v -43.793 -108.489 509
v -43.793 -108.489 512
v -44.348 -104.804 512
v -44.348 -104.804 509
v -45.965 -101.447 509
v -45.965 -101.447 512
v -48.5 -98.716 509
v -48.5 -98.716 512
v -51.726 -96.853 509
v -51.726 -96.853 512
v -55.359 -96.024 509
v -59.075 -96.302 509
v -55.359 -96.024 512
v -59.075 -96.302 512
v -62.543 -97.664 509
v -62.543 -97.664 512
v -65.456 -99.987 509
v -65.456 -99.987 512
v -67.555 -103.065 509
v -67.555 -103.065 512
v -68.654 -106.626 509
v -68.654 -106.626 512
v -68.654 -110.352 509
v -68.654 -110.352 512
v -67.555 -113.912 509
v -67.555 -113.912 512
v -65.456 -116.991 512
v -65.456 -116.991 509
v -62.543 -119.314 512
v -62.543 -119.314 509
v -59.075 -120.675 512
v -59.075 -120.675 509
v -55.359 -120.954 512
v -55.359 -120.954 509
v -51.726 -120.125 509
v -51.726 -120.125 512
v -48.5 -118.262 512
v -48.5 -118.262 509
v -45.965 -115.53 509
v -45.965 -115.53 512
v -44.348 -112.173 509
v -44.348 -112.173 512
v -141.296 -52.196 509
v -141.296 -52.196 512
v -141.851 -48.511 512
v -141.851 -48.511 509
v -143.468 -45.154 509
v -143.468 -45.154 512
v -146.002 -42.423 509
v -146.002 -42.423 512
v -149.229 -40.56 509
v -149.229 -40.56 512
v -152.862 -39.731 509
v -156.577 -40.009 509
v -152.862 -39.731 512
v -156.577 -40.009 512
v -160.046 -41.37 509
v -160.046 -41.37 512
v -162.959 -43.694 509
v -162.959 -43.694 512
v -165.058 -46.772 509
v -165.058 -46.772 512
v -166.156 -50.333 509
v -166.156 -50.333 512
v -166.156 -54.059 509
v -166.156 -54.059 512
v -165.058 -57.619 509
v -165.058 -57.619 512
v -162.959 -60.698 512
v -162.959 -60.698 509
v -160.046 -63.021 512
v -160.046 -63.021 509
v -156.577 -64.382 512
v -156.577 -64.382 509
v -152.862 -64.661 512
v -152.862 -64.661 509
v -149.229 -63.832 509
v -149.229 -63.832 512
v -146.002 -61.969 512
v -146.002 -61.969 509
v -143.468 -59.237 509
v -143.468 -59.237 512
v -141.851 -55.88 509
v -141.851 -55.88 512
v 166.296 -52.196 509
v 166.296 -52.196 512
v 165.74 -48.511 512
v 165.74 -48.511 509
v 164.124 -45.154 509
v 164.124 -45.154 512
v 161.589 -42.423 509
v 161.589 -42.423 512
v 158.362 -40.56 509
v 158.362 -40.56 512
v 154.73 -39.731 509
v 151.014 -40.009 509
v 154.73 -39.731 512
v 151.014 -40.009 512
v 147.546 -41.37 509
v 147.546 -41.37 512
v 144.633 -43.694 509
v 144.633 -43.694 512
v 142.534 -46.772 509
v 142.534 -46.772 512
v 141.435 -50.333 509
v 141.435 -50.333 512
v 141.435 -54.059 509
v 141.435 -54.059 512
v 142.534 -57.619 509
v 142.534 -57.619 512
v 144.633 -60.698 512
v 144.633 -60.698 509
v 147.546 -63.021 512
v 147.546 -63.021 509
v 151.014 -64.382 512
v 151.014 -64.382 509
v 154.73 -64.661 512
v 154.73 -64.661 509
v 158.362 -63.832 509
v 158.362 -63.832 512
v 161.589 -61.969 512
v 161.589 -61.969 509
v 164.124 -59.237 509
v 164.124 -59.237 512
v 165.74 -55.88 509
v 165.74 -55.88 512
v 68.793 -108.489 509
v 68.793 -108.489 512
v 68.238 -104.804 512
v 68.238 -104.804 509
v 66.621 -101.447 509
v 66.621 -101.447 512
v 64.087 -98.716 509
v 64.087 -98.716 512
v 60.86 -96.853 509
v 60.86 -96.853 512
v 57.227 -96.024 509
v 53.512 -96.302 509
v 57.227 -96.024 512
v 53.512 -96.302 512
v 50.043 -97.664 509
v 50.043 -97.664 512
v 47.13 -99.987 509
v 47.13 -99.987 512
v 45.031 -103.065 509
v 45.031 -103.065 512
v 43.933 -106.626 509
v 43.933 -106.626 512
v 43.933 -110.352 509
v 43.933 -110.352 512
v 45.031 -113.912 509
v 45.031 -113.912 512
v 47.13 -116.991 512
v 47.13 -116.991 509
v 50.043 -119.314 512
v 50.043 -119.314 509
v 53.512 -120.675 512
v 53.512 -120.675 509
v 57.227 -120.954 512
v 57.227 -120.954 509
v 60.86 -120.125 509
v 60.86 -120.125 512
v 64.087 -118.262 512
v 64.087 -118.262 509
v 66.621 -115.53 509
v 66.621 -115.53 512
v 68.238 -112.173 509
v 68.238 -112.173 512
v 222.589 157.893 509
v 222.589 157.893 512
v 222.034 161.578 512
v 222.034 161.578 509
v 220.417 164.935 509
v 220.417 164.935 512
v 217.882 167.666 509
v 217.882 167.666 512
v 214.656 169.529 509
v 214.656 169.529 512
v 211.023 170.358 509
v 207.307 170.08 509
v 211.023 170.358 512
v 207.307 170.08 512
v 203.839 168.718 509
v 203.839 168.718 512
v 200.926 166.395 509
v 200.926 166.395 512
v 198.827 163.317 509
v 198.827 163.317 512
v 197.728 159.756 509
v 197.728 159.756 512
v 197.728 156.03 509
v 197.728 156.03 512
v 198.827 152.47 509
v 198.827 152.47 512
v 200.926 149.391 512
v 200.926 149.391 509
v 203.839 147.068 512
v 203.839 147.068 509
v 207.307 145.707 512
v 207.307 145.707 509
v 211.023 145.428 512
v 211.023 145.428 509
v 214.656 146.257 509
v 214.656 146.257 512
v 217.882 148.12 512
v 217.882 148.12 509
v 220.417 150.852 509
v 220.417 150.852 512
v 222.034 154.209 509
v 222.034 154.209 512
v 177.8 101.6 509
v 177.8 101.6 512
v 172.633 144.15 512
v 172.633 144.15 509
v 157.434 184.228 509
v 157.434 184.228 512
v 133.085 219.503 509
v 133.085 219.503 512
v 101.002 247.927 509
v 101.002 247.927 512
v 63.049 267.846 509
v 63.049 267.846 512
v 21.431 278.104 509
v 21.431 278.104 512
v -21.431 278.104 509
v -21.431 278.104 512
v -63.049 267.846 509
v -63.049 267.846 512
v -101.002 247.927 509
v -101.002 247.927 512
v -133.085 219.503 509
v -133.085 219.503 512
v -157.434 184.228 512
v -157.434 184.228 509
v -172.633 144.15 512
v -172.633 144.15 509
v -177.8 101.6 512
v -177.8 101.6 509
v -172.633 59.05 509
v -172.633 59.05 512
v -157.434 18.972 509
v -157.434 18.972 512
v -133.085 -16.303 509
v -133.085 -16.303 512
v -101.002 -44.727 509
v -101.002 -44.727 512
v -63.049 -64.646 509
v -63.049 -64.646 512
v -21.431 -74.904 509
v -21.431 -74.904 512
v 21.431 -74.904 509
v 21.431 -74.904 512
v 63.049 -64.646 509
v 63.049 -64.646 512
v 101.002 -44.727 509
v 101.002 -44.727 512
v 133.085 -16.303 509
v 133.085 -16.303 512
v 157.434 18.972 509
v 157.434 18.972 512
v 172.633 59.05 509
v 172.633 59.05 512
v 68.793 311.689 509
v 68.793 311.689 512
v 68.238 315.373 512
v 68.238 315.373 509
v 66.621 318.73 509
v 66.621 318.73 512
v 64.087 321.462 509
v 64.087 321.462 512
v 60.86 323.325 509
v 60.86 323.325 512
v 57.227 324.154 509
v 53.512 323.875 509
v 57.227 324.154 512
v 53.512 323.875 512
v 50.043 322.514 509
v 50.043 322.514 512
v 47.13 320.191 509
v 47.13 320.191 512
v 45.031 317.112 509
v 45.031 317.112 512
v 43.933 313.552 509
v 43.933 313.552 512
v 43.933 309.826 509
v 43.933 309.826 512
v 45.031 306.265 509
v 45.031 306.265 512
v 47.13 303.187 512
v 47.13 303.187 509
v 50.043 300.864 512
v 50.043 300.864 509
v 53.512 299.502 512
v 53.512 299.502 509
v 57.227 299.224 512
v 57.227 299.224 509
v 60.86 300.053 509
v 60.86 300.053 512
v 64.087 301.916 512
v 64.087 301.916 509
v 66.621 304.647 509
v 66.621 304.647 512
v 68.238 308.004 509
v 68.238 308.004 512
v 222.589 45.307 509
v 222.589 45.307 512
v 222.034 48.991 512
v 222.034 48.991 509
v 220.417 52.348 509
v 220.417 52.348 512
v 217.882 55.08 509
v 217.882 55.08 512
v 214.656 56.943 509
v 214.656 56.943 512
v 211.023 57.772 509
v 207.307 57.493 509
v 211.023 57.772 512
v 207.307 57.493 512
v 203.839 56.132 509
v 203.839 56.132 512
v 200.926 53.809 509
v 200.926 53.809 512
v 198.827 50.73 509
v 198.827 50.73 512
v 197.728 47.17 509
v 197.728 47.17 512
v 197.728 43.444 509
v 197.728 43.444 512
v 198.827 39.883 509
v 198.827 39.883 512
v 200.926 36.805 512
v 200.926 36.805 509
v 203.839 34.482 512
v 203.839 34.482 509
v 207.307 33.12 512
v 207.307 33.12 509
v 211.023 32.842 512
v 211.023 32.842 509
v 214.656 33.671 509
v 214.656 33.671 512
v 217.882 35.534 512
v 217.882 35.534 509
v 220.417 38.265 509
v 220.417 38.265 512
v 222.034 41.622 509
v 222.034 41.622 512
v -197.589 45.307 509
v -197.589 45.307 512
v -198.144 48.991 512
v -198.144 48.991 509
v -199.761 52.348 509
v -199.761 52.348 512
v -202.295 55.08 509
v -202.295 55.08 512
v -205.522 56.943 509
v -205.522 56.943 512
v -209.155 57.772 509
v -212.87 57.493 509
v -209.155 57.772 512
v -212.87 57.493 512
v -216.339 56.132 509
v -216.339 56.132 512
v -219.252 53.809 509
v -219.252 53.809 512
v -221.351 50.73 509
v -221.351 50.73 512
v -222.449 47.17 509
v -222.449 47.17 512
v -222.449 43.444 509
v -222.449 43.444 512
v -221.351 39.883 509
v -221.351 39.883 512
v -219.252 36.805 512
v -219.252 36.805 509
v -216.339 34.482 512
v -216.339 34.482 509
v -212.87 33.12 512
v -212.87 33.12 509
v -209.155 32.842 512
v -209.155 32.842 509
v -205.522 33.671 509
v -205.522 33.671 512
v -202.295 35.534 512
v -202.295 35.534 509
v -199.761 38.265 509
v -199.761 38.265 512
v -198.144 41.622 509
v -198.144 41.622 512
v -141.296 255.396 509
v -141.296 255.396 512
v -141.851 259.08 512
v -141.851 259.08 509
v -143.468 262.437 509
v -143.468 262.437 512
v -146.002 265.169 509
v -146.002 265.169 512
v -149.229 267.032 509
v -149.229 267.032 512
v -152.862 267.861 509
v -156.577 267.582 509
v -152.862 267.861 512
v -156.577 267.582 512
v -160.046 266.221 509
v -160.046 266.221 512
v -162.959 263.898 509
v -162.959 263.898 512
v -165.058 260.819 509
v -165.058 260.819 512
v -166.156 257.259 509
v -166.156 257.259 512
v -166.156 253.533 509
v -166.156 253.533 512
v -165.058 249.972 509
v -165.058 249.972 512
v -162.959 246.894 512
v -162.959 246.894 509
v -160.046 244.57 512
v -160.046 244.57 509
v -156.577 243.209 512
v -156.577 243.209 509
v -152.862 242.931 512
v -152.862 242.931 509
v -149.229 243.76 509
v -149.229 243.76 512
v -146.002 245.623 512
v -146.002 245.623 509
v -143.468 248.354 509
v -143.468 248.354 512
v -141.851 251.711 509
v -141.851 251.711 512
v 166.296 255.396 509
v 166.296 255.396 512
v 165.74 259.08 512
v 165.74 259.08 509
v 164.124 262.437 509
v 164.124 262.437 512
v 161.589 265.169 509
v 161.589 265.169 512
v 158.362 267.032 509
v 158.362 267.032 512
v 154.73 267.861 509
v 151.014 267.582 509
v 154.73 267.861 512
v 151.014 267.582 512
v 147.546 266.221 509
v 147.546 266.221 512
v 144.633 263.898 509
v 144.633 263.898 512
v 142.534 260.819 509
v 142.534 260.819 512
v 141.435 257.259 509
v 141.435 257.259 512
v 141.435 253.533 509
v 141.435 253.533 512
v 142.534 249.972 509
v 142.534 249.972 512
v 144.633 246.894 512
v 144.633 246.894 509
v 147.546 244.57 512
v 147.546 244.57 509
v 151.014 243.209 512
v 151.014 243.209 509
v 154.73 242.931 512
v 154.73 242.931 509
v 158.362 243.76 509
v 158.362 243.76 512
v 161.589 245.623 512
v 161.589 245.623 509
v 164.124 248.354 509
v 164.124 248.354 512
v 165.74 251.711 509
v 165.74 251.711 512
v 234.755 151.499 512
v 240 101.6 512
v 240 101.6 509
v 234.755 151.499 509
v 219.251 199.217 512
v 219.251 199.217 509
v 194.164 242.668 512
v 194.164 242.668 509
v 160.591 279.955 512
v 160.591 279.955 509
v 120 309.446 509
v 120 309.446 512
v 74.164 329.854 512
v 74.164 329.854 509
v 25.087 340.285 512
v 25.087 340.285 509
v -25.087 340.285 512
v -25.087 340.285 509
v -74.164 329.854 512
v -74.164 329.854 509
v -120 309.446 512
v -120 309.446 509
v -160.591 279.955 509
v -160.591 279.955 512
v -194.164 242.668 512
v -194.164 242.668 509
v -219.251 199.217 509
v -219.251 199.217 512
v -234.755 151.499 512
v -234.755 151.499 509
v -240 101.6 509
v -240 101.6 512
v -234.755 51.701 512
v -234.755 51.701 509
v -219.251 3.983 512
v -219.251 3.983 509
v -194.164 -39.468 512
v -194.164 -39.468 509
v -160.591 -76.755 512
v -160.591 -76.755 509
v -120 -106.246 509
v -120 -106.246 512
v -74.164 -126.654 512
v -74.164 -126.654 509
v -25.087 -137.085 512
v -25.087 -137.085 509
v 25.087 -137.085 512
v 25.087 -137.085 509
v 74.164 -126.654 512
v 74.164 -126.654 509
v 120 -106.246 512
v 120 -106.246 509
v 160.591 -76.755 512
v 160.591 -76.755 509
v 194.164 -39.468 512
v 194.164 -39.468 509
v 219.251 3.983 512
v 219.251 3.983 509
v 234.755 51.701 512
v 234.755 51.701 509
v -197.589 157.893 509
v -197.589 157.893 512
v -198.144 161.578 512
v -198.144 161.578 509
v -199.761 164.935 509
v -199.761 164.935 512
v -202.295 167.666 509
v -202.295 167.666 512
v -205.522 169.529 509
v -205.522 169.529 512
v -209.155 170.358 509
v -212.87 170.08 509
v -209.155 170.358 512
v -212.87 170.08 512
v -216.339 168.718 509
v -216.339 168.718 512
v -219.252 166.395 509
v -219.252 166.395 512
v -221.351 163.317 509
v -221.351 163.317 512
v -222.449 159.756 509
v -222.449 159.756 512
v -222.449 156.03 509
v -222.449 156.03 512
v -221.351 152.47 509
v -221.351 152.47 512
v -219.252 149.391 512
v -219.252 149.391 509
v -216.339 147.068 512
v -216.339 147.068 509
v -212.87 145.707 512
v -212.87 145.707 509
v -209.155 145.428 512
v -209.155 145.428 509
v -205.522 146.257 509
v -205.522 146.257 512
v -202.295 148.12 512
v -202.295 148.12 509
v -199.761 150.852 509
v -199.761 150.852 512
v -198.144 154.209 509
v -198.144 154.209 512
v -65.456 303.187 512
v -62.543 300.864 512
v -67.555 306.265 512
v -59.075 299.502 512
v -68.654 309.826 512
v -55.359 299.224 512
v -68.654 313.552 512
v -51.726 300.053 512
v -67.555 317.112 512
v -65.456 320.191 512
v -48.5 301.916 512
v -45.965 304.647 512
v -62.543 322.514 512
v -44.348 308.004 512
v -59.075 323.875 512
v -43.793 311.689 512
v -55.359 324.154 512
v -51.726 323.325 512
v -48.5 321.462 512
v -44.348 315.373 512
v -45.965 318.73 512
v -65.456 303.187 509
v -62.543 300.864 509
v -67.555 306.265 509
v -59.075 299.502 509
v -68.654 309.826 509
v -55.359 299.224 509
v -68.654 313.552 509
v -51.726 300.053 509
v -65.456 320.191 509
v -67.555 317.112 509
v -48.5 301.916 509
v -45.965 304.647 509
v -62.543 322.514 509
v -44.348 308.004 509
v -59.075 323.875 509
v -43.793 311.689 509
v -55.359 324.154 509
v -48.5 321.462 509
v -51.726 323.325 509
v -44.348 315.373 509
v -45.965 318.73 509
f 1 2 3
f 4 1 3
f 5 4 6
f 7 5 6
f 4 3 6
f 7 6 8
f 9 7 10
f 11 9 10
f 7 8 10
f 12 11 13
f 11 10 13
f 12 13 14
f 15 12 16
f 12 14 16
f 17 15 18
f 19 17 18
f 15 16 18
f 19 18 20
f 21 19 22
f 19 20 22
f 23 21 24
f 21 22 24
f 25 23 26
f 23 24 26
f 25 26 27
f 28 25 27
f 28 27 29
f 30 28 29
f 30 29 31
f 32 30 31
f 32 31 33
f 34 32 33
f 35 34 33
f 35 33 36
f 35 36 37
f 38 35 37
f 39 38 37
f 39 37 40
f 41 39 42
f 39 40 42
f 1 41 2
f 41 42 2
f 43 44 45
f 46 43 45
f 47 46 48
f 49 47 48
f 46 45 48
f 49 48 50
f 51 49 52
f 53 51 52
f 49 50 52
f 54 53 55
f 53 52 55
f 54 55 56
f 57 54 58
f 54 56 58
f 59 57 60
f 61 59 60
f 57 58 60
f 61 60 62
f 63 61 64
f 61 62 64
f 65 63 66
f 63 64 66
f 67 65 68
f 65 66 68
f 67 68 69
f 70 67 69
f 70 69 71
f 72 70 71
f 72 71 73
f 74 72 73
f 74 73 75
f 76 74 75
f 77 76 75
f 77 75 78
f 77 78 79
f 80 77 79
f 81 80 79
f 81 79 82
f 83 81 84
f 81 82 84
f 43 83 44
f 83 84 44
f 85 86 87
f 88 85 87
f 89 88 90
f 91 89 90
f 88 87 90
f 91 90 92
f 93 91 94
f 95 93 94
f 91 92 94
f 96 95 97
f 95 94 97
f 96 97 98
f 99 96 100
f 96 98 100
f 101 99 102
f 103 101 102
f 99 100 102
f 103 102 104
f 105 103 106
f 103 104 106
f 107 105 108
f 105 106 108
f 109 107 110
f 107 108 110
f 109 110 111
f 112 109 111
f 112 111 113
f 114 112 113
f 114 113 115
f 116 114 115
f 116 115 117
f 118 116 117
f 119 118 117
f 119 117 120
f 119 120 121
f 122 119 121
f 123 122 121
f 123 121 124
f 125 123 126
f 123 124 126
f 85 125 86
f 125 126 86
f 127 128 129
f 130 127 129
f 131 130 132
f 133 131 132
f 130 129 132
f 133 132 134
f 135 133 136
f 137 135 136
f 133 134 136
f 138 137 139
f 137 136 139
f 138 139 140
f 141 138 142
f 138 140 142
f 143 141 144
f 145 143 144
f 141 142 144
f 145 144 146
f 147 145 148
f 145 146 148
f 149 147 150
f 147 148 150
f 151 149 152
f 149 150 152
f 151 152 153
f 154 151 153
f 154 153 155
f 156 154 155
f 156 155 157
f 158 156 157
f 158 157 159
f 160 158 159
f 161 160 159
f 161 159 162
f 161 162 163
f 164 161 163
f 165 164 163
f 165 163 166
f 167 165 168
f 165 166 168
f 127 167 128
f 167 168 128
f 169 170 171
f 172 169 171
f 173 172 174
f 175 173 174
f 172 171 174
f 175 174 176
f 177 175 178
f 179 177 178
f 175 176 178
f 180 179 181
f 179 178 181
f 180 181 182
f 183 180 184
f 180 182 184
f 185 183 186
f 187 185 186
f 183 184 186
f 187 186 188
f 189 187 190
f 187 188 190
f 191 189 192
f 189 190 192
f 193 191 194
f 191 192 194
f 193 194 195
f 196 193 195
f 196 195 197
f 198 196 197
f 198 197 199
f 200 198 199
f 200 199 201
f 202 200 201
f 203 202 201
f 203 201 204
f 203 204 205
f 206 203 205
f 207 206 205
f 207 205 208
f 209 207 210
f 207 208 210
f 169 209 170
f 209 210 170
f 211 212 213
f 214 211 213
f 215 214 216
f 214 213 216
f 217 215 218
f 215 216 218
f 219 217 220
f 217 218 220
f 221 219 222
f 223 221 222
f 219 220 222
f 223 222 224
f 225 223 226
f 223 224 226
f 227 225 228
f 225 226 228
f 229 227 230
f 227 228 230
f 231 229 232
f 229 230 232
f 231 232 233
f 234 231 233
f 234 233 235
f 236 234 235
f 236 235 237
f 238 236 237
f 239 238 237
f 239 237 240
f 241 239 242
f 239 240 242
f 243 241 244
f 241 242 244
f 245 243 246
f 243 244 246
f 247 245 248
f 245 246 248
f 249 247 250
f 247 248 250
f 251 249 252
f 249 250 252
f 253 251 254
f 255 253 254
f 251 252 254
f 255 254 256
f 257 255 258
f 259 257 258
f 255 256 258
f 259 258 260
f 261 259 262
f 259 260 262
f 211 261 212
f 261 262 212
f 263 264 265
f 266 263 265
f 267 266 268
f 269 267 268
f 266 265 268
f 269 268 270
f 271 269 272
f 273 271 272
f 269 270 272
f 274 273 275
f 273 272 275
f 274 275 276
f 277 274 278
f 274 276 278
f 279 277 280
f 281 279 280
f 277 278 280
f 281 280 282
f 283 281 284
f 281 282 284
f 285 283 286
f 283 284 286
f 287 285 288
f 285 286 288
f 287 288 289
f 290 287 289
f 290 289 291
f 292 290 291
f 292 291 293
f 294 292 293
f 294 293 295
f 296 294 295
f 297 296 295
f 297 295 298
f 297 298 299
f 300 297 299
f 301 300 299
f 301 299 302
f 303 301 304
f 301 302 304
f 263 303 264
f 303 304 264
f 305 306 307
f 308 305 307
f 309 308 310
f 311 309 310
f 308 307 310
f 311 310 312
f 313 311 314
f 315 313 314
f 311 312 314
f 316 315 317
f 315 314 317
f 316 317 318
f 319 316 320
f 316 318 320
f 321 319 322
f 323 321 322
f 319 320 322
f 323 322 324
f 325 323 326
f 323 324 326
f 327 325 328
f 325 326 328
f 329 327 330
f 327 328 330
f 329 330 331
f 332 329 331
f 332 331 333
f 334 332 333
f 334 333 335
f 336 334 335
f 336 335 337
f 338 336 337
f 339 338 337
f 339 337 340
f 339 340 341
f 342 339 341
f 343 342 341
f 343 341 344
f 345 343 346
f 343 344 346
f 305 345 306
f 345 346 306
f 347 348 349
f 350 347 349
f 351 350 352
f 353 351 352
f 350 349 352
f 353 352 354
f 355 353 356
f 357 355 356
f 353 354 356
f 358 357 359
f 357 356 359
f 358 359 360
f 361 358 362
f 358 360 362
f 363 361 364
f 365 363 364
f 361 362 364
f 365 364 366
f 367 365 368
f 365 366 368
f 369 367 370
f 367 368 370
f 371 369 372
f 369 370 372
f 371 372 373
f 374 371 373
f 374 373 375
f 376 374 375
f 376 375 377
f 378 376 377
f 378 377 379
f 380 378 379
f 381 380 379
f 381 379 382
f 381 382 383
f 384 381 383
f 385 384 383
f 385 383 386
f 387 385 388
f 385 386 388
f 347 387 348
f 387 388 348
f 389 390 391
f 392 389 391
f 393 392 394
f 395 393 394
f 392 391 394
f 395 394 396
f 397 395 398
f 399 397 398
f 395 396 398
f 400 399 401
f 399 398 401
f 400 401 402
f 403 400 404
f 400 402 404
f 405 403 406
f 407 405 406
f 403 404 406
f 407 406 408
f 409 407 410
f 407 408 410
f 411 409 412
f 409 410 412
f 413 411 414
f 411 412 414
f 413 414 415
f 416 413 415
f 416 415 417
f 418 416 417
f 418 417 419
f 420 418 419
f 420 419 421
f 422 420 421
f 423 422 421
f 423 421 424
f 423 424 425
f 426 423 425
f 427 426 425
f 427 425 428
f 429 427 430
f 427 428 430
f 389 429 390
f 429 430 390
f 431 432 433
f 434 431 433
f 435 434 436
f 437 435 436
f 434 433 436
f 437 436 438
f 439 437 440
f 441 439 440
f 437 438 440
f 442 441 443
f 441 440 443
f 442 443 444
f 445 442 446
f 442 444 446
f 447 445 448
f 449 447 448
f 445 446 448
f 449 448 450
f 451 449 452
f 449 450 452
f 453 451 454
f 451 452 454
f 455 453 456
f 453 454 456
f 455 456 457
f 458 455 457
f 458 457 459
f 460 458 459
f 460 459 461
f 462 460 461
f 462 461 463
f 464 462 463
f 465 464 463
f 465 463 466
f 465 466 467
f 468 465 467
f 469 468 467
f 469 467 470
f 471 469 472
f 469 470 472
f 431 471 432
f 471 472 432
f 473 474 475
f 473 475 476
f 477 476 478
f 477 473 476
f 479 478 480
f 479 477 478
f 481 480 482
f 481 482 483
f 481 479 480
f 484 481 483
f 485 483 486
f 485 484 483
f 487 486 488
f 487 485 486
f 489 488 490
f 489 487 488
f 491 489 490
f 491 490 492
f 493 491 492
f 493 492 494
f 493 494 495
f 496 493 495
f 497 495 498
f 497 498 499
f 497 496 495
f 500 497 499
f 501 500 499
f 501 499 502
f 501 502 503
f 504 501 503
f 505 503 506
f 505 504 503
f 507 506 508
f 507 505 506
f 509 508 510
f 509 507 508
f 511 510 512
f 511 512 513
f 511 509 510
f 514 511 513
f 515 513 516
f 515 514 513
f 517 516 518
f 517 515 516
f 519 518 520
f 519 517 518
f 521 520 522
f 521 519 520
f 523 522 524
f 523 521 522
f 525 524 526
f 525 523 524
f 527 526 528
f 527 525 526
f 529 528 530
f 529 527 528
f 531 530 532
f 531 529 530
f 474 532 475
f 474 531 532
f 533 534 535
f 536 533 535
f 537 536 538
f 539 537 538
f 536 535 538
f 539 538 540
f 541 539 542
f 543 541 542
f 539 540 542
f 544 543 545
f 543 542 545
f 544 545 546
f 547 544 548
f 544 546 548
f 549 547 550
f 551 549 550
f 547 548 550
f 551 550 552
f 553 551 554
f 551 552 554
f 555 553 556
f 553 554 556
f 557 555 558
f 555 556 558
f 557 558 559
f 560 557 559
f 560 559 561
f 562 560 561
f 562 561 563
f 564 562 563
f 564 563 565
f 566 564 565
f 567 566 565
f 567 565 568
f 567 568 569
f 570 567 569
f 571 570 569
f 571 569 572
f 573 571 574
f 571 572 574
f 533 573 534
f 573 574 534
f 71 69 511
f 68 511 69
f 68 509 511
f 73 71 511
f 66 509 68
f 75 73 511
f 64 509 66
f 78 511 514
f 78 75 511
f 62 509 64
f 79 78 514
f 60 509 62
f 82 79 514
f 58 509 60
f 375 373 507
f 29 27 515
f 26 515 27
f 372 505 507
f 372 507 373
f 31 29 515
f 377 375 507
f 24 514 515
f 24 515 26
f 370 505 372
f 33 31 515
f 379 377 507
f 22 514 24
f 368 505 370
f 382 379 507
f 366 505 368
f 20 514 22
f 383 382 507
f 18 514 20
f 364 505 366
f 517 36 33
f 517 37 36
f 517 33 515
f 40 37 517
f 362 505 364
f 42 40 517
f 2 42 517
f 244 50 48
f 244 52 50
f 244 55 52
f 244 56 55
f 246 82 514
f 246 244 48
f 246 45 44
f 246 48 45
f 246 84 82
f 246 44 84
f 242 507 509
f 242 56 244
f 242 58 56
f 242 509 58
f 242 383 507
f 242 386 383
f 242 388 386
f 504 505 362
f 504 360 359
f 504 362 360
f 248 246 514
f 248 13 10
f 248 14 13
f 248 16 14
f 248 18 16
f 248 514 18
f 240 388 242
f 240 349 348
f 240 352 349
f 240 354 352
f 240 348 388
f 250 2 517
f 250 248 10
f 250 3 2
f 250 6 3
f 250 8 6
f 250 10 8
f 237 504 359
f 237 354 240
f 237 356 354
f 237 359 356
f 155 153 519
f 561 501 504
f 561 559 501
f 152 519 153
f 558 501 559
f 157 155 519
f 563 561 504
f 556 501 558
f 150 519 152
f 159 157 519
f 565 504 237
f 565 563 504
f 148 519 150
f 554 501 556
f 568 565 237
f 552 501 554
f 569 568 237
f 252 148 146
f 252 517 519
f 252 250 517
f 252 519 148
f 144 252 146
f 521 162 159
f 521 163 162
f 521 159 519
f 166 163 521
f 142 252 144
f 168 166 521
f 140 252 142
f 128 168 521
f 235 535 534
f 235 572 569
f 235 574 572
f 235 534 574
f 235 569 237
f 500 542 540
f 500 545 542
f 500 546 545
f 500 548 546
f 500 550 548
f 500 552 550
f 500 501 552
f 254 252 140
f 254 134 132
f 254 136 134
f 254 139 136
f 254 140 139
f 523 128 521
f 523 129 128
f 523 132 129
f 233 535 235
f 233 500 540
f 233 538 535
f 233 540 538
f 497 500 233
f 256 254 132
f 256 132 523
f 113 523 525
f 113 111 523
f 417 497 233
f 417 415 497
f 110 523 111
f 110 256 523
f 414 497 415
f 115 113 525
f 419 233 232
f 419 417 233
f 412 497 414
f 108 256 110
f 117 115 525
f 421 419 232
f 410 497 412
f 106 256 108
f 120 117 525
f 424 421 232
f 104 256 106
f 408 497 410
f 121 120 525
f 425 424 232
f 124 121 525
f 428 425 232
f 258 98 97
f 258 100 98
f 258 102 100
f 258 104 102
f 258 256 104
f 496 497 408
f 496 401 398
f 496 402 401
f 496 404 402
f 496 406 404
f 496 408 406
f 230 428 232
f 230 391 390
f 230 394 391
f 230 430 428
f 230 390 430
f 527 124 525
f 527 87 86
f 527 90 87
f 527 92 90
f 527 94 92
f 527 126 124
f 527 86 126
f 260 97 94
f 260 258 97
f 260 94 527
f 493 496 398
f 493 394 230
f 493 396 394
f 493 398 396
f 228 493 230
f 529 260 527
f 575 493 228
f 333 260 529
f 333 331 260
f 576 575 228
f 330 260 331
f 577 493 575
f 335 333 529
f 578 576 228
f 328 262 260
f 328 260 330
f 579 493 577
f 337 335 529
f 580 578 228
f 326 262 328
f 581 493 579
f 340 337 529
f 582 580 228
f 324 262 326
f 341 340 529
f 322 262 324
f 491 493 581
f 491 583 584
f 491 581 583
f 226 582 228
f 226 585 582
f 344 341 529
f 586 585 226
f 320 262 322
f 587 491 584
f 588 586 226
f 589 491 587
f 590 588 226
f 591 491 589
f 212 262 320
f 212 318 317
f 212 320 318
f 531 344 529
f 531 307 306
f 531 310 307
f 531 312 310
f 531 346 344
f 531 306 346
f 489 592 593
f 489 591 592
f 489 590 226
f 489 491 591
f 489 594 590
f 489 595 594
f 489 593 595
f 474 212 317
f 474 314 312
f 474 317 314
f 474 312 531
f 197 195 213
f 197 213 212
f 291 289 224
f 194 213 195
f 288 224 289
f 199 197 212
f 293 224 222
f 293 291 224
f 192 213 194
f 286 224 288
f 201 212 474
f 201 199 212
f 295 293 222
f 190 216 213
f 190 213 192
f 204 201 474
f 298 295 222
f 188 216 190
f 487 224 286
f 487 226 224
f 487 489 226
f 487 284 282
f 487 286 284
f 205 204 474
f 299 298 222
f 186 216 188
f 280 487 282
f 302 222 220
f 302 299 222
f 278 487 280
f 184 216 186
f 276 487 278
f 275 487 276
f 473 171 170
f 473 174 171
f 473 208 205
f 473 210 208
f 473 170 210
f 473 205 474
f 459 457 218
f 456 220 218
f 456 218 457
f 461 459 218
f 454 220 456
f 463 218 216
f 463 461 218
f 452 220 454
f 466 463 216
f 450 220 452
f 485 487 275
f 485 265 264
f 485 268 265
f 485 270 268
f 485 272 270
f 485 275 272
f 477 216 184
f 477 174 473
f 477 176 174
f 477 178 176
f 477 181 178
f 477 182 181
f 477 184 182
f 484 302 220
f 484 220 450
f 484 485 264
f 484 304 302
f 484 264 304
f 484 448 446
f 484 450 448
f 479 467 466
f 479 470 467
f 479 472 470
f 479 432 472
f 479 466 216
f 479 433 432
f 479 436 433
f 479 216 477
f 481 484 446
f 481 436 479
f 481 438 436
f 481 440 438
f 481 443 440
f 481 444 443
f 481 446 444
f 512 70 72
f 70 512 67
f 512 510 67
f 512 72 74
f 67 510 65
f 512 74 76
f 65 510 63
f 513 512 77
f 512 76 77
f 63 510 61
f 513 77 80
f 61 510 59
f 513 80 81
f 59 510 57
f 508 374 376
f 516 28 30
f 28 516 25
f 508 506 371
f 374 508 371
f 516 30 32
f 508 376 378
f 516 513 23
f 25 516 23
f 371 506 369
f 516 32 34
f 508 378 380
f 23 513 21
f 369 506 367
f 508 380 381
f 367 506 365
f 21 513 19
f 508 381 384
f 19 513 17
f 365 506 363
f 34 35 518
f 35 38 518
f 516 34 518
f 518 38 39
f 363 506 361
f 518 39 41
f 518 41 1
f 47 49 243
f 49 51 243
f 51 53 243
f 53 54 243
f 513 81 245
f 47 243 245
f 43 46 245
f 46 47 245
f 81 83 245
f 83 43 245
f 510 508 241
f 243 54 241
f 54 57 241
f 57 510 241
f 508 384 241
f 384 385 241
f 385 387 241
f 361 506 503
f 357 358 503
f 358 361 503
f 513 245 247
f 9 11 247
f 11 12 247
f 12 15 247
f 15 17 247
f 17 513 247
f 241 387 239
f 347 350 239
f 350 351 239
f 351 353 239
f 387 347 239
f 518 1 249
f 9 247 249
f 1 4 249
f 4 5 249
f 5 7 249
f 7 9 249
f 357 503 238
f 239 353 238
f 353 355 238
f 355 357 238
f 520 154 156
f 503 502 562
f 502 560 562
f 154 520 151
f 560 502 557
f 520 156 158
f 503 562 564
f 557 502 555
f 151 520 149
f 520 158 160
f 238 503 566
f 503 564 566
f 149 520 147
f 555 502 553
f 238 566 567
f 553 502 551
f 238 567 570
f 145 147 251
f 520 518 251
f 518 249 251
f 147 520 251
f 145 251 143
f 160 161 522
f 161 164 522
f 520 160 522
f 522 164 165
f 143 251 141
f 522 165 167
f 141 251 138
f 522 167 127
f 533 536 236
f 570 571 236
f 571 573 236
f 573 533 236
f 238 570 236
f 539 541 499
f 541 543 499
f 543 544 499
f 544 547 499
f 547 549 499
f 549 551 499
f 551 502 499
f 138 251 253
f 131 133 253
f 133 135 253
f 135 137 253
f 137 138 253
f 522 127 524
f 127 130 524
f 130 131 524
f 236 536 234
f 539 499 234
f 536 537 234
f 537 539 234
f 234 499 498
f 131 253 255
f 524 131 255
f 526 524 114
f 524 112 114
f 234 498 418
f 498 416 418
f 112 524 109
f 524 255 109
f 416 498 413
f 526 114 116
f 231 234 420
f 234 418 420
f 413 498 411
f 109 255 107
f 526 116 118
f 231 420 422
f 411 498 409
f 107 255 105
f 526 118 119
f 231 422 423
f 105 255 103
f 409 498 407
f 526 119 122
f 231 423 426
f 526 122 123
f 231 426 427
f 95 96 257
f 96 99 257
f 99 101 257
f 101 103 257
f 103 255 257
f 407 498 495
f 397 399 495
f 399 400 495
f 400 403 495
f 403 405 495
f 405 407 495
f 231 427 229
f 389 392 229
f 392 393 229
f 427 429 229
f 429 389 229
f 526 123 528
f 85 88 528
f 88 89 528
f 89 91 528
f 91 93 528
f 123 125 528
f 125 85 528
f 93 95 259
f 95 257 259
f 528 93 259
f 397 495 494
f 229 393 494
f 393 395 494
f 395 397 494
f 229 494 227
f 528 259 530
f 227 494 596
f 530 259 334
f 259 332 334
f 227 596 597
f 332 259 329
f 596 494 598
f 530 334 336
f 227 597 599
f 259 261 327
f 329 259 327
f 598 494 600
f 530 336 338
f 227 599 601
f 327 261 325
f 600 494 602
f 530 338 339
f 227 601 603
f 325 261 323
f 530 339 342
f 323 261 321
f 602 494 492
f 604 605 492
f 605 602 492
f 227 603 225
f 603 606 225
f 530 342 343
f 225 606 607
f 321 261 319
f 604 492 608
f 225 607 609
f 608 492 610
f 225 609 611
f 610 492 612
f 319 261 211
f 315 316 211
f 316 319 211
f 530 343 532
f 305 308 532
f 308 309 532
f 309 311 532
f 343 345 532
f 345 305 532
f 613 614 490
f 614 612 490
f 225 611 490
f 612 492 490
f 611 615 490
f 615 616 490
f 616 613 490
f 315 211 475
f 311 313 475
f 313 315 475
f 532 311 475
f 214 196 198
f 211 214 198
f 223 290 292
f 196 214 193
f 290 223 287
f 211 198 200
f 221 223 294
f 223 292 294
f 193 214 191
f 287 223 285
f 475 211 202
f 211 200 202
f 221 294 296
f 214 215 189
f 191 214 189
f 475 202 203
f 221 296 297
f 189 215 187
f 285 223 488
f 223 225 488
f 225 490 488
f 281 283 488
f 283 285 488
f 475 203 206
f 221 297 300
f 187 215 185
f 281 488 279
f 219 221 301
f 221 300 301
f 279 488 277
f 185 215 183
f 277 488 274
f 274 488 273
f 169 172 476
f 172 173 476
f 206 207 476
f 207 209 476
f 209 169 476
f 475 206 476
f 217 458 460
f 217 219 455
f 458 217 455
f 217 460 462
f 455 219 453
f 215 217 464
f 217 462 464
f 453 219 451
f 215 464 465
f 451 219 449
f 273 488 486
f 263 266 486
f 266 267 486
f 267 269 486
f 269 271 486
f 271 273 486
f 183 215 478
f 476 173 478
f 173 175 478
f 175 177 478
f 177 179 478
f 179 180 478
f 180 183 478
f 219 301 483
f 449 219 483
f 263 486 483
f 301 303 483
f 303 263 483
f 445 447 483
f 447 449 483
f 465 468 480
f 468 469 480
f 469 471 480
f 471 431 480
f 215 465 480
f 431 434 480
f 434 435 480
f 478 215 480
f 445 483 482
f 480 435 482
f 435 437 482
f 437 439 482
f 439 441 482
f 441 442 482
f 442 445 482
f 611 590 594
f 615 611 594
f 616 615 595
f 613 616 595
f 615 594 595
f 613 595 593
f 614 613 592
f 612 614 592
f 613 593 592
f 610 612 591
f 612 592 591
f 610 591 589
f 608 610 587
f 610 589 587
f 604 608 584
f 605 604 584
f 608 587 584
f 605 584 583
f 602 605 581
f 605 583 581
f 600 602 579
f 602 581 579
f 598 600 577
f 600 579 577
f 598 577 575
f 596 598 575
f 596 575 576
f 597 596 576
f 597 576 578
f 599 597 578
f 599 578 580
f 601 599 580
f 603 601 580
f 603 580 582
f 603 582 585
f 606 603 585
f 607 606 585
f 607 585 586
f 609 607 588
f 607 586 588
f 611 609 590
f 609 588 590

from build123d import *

# Parameters (mm, degrees)
F1_R     = 240
F1_R_2   = 12.5
F1_R_3   = 177.8
F2_DEPTH = 3


with BuildPart() as f2:
    # F1 (on offset) → F2 (new body)
    with BuildSketch(Plane.XY.offset(512)):
        with Locations((0, 101.6)):
            Circle(F1_R)
        with Locations((-153.795725, -52.195725)):
            Circle(F1_R_2, mode=Mode.SUBTRACT)
        with Locations((-56.293142, -108.488867)):
            Circle(F1_R_2, mode=Mode.SUBTRACT)
        with Locations((-210.088867, 45.306858)):
            Circle(F1_R_2, mode=Mode.SUBTRACT)
        with Locations((56.293142, -108.488867)):
            Circle(F1_R_2, mode=Mode.SUBTRACT)
        with Locations((153.795725, -52.195725)):
            Circle(F1_R_2, mode=Mode.SUBTRACT)
        with Locations((210.088867, 45.306858)):
            Circle(F1_R_2, mode=Mode.SUBTRACT)
        with Locations((-210.088867, 157.893142)):
            Circle(F1_R_2, mode=Mode.SUBTRACT)
        with Locations((-153.795725, 255.395725)):
            Circle(F1_R_2, mode=Mode.SUBTRACT)
        with Locations((-56.293142, 311.688867)):
            Circle(F1_R_2, mode=Mode.SUBTRACT)
        with Locations((0, 101.6)):
            Circle(F1_R_3, mode=Mode.SUBTRACT)
        with Locations((210.088867, 157.893142)):
            Circle(F1_R_2, mode=Mode.SUBTRACT)
        with Locations((56.293142, 311.688867)):
            Circle(F1_R_2, mode=Mode.SUBTRACT)
        with Locations((153.795725, 255.395725)):
            Circle(F1_R_2, mode=Mode.SUBTRACT)
    extrude(amount=-F2_DEPTH)


solid = f2.part
